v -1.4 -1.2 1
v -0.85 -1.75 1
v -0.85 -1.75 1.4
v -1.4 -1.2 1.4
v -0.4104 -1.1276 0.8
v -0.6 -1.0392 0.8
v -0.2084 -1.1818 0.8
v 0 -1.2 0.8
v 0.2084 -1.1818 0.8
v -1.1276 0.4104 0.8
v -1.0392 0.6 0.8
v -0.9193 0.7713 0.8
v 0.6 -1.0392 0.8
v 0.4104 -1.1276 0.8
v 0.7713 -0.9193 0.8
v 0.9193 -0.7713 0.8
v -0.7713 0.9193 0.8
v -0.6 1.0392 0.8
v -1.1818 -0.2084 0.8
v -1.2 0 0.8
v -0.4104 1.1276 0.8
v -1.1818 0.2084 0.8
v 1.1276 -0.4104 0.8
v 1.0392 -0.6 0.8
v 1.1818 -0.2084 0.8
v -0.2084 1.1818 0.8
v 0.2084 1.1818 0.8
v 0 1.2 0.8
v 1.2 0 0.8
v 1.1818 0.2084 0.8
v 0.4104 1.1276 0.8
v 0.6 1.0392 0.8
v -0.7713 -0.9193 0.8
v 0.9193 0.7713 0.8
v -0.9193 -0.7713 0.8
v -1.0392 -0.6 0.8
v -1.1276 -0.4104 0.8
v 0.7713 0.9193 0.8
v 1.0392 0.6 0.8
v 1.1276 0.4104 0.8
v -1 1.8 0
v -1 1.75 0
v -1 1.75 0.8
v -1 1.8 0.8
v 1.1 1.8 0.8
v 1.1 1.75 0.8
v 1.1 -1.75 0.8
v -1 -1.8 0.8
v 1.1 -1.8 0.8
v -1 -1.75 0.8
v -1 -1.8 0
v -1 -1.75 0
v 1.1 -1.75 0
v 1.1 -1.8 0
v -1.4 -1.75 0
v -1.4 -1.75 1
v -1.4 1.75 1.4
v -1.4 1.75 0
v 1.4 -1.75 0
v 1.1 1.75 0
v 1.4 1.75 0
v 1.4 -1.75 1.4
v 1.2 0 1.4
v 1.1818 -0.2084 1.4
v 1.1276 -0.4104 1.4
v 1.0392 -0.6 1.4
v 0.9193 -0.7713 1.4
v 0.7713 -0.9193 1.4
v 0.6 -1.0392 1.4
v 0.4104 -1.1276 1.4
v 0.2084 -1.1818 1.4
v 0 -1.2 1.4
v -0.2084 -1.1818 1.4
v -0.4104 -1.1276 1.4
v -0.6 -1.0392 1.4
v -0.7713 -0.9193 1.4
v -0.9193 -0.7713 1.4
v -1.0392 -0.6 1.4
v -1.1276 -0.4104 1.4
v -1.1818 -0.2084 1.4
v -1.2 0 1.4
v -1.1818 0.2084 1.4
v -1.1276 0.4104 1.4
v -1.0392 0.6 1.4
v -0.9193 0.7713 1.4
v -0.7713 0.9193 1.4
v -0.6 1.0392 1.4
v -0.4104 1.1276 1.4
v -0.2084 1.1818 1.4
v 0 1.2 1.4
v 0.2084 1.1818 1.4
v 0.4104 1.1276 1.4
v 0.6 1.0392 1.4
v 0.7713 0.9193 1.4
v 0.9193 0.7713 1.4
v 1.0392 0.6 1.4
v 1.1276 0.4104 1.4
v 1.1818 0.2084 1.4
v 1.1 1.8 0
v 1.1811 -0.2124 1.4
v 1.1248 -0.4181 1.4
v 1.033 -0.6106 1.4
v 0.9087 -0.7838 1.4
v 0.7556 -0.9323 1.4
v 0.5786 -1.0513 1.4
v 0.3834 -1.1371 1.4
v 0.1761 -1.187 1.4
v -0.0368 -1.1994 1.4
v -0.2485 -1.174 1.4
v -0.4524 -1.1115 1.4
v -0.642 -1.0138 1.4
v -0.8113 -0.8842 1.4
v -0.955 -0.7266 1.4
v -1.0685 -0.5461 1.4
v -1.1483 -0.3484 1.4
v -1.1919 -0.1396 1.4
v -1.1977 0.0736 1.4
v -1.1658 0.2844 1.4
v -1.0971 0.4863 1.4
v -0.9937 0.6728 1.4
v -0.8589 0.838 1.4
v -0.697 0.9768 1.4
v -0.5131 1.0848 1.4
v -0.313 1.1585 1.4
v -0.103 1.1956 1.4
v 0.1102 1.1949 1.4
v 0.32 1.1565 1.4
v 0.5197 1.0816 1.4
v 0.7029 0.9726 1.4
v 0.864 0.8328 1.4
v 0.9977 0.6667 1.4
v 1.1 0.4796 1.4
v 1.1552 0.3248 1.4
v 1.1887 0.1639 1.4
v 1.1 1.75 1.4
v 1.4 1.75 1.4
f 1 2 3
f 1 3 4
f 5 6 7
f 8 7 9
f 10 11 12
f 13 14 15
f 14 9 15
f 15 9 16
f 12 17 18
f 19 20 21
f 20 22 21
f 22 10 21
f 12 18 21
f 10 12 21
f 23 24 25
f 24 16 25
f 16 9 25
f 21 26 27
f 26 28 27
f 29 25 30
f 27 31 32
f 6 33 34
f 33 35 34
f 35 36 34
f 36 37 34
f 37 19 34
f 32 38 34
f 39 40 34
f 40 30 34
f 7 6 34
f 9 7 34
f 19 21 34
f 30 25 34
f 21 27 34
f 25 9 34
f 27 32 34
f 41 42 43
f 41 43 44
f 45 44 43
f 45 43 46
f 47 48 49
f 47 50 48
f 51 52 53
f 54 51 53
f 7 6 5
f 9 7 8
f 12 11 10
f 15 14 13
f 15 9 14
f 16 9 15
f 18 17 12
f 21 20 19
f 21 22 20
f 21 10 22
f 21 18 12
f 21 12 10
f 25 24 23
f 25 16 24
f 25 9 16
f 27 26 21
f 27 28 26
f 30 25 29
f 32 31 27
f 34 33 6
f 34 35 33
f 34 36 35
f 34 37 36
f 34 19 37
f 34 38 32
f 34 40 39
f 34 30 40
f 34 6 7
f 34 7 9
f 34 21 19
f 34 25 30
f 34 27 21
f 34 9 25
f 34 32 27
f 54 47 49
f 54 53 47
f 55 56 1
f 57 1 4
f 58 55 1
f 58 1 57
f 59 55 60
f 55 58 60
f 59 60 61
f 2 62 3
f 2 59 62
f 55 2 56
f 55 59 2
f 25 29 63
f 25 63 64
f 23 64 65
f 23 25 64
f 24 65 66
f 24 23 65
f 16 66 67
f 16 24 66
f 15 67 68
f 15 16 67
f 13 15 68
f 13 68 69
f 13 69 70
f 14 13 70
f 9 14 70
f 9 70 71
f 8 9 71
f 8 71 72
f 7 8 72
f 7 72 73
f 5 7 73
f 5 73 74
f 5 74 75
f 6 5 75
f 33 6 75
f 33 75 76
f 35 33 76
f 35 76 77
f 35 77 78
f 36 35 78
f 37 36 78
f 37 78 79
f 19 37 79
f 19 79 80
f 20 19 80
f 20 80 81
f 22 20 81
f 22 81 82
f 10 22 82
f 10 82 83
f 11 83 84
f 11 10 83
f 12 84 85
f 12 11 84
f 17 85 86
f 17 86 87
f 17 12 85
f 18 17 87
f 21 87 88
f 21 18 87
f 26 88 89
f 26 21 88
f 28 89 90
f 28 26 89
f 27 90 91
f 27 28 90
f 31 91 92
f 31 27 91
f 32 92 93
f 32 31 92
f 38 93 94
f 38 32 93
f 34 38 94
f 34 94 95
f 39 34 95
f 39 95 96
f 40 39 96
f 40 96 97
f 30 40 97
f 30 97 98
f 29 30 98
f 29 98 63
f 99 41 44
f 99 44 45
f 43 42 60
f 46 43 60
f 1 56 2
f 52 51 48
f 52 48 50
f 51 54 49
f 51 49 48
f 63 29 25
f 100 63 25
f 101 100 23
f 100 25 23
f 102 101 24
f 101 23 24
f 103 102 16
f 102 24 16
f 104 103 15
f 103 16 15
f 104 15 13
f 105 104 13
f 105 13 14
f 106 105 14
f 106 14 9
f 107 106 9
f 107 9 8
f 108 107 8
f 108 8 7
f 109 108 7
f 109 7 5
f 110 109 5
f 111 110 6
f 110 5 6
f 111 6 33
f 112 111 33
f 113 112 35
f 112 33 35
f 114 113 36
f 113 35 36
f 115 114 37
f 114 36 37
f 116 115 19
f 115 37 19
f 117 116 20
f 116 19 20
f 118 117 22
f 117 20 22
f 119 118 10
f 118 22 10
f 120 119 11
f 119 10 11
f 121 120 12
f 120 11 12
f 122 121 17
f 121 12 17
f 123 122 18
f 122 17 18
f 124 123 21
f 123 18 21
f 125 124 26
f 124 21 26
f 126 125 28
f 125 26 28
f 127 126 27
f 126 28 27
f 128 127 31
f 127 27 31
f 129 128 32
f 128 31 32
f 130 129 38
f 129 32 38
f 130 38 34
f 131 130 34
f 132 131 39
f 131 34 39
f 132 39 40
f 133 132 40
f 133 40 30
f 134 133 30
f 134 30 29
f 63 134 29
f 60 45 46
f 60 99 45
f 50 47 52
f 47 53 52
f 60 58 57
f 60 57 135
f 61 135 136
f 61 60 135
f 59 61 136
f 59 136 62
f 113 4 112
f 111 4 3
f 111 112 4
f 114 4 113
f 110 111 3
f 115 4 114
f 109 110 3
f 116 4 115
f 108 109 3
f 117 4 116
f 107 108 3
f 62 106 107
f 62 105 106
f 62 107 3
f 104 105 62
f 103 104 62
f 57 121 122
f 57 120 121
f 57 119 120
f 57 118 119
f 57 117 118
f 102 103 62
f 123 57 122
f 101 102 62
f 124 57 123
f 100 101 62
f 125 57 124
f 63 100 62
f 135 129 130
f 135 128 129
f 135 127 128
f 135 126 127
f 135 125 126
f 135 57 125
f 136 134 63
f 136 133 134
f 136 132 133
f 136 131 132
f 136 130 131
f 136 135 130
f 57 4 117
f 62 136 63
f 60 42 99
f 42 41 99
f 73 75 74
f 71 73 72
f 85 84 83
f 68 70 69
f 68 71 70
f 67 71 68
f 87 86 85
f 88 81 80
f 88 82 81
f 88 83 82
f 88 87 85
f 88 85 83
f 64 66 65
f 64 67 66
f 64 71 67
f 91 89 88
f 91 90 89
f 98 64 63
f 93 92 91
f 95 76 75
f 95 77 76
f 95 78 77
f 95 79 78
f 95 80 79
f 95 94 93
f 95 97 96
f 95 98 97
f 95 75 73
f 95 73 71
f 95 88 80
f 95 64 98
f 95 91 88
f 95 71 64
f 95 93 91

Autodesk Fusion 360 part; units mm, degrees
sketch "Sketch1" plane through (0, 0, 0) normal (0, 0, 1) x (1, 0, 0)
  line L0 (-1.4, 1.75) -> (1.4, 1.75)
  line L1 (1.4, 1.75) -> (1.4, -1.75)
  line L2 (1.4, -1.75) -> (-1.4, -1.75)
  line L3 (-1.4, -1.75) -> (-1.4, 1.75)
  circle A0 centre (0, 0) radius 1.2
  line L4 (-0.85, -1.75) -> (-1.4, -1.2)
  line L5 (-1, 1.8) -> (1.1, 1.8)
  line L6 (1.1, -1.8) -> (-1, -1.8)
  line L7 (-1, 1.75) -> (-1, 1.8)
  line L8 (1.1, 1.8) -> (1.1, 0.4796)
  line L9 (1.1, -1.75) -> (1.1, -1.8)
  line L10 (-1, -1.8) -> (-1, -1.75)
  dimension "d3" = 2.4
extrude "Extrude1" add sketch "Sketch1" along normal blind 1.4 contours L0 L1 L2 L3 L4 makes body 1
extrude "Extrude2" add sketch "Sketch1" along normal blind 0.8 contours A0 bodies 1
extrude "Extrude3" add sketch "Sketch1" along normal blind 1 contours L2 L3 L4 bodies 1
extrude "Extrude4" add 1 faces at (-0.3517, 0.6444, 0.8) along direction (0, 0, 1) blind 0.6 separate body on bodies 1 makes body 2
extrude "Extrude5" add sketch "Sketch1" along normal blind 0.8 separate body contours L0 L5 L7 L8 | L2 L6 L9 L10 makes body 3 at (-0.3, 1.8, 0.2667) makes body 4 at (0.4, -1.75, 0.2667)
